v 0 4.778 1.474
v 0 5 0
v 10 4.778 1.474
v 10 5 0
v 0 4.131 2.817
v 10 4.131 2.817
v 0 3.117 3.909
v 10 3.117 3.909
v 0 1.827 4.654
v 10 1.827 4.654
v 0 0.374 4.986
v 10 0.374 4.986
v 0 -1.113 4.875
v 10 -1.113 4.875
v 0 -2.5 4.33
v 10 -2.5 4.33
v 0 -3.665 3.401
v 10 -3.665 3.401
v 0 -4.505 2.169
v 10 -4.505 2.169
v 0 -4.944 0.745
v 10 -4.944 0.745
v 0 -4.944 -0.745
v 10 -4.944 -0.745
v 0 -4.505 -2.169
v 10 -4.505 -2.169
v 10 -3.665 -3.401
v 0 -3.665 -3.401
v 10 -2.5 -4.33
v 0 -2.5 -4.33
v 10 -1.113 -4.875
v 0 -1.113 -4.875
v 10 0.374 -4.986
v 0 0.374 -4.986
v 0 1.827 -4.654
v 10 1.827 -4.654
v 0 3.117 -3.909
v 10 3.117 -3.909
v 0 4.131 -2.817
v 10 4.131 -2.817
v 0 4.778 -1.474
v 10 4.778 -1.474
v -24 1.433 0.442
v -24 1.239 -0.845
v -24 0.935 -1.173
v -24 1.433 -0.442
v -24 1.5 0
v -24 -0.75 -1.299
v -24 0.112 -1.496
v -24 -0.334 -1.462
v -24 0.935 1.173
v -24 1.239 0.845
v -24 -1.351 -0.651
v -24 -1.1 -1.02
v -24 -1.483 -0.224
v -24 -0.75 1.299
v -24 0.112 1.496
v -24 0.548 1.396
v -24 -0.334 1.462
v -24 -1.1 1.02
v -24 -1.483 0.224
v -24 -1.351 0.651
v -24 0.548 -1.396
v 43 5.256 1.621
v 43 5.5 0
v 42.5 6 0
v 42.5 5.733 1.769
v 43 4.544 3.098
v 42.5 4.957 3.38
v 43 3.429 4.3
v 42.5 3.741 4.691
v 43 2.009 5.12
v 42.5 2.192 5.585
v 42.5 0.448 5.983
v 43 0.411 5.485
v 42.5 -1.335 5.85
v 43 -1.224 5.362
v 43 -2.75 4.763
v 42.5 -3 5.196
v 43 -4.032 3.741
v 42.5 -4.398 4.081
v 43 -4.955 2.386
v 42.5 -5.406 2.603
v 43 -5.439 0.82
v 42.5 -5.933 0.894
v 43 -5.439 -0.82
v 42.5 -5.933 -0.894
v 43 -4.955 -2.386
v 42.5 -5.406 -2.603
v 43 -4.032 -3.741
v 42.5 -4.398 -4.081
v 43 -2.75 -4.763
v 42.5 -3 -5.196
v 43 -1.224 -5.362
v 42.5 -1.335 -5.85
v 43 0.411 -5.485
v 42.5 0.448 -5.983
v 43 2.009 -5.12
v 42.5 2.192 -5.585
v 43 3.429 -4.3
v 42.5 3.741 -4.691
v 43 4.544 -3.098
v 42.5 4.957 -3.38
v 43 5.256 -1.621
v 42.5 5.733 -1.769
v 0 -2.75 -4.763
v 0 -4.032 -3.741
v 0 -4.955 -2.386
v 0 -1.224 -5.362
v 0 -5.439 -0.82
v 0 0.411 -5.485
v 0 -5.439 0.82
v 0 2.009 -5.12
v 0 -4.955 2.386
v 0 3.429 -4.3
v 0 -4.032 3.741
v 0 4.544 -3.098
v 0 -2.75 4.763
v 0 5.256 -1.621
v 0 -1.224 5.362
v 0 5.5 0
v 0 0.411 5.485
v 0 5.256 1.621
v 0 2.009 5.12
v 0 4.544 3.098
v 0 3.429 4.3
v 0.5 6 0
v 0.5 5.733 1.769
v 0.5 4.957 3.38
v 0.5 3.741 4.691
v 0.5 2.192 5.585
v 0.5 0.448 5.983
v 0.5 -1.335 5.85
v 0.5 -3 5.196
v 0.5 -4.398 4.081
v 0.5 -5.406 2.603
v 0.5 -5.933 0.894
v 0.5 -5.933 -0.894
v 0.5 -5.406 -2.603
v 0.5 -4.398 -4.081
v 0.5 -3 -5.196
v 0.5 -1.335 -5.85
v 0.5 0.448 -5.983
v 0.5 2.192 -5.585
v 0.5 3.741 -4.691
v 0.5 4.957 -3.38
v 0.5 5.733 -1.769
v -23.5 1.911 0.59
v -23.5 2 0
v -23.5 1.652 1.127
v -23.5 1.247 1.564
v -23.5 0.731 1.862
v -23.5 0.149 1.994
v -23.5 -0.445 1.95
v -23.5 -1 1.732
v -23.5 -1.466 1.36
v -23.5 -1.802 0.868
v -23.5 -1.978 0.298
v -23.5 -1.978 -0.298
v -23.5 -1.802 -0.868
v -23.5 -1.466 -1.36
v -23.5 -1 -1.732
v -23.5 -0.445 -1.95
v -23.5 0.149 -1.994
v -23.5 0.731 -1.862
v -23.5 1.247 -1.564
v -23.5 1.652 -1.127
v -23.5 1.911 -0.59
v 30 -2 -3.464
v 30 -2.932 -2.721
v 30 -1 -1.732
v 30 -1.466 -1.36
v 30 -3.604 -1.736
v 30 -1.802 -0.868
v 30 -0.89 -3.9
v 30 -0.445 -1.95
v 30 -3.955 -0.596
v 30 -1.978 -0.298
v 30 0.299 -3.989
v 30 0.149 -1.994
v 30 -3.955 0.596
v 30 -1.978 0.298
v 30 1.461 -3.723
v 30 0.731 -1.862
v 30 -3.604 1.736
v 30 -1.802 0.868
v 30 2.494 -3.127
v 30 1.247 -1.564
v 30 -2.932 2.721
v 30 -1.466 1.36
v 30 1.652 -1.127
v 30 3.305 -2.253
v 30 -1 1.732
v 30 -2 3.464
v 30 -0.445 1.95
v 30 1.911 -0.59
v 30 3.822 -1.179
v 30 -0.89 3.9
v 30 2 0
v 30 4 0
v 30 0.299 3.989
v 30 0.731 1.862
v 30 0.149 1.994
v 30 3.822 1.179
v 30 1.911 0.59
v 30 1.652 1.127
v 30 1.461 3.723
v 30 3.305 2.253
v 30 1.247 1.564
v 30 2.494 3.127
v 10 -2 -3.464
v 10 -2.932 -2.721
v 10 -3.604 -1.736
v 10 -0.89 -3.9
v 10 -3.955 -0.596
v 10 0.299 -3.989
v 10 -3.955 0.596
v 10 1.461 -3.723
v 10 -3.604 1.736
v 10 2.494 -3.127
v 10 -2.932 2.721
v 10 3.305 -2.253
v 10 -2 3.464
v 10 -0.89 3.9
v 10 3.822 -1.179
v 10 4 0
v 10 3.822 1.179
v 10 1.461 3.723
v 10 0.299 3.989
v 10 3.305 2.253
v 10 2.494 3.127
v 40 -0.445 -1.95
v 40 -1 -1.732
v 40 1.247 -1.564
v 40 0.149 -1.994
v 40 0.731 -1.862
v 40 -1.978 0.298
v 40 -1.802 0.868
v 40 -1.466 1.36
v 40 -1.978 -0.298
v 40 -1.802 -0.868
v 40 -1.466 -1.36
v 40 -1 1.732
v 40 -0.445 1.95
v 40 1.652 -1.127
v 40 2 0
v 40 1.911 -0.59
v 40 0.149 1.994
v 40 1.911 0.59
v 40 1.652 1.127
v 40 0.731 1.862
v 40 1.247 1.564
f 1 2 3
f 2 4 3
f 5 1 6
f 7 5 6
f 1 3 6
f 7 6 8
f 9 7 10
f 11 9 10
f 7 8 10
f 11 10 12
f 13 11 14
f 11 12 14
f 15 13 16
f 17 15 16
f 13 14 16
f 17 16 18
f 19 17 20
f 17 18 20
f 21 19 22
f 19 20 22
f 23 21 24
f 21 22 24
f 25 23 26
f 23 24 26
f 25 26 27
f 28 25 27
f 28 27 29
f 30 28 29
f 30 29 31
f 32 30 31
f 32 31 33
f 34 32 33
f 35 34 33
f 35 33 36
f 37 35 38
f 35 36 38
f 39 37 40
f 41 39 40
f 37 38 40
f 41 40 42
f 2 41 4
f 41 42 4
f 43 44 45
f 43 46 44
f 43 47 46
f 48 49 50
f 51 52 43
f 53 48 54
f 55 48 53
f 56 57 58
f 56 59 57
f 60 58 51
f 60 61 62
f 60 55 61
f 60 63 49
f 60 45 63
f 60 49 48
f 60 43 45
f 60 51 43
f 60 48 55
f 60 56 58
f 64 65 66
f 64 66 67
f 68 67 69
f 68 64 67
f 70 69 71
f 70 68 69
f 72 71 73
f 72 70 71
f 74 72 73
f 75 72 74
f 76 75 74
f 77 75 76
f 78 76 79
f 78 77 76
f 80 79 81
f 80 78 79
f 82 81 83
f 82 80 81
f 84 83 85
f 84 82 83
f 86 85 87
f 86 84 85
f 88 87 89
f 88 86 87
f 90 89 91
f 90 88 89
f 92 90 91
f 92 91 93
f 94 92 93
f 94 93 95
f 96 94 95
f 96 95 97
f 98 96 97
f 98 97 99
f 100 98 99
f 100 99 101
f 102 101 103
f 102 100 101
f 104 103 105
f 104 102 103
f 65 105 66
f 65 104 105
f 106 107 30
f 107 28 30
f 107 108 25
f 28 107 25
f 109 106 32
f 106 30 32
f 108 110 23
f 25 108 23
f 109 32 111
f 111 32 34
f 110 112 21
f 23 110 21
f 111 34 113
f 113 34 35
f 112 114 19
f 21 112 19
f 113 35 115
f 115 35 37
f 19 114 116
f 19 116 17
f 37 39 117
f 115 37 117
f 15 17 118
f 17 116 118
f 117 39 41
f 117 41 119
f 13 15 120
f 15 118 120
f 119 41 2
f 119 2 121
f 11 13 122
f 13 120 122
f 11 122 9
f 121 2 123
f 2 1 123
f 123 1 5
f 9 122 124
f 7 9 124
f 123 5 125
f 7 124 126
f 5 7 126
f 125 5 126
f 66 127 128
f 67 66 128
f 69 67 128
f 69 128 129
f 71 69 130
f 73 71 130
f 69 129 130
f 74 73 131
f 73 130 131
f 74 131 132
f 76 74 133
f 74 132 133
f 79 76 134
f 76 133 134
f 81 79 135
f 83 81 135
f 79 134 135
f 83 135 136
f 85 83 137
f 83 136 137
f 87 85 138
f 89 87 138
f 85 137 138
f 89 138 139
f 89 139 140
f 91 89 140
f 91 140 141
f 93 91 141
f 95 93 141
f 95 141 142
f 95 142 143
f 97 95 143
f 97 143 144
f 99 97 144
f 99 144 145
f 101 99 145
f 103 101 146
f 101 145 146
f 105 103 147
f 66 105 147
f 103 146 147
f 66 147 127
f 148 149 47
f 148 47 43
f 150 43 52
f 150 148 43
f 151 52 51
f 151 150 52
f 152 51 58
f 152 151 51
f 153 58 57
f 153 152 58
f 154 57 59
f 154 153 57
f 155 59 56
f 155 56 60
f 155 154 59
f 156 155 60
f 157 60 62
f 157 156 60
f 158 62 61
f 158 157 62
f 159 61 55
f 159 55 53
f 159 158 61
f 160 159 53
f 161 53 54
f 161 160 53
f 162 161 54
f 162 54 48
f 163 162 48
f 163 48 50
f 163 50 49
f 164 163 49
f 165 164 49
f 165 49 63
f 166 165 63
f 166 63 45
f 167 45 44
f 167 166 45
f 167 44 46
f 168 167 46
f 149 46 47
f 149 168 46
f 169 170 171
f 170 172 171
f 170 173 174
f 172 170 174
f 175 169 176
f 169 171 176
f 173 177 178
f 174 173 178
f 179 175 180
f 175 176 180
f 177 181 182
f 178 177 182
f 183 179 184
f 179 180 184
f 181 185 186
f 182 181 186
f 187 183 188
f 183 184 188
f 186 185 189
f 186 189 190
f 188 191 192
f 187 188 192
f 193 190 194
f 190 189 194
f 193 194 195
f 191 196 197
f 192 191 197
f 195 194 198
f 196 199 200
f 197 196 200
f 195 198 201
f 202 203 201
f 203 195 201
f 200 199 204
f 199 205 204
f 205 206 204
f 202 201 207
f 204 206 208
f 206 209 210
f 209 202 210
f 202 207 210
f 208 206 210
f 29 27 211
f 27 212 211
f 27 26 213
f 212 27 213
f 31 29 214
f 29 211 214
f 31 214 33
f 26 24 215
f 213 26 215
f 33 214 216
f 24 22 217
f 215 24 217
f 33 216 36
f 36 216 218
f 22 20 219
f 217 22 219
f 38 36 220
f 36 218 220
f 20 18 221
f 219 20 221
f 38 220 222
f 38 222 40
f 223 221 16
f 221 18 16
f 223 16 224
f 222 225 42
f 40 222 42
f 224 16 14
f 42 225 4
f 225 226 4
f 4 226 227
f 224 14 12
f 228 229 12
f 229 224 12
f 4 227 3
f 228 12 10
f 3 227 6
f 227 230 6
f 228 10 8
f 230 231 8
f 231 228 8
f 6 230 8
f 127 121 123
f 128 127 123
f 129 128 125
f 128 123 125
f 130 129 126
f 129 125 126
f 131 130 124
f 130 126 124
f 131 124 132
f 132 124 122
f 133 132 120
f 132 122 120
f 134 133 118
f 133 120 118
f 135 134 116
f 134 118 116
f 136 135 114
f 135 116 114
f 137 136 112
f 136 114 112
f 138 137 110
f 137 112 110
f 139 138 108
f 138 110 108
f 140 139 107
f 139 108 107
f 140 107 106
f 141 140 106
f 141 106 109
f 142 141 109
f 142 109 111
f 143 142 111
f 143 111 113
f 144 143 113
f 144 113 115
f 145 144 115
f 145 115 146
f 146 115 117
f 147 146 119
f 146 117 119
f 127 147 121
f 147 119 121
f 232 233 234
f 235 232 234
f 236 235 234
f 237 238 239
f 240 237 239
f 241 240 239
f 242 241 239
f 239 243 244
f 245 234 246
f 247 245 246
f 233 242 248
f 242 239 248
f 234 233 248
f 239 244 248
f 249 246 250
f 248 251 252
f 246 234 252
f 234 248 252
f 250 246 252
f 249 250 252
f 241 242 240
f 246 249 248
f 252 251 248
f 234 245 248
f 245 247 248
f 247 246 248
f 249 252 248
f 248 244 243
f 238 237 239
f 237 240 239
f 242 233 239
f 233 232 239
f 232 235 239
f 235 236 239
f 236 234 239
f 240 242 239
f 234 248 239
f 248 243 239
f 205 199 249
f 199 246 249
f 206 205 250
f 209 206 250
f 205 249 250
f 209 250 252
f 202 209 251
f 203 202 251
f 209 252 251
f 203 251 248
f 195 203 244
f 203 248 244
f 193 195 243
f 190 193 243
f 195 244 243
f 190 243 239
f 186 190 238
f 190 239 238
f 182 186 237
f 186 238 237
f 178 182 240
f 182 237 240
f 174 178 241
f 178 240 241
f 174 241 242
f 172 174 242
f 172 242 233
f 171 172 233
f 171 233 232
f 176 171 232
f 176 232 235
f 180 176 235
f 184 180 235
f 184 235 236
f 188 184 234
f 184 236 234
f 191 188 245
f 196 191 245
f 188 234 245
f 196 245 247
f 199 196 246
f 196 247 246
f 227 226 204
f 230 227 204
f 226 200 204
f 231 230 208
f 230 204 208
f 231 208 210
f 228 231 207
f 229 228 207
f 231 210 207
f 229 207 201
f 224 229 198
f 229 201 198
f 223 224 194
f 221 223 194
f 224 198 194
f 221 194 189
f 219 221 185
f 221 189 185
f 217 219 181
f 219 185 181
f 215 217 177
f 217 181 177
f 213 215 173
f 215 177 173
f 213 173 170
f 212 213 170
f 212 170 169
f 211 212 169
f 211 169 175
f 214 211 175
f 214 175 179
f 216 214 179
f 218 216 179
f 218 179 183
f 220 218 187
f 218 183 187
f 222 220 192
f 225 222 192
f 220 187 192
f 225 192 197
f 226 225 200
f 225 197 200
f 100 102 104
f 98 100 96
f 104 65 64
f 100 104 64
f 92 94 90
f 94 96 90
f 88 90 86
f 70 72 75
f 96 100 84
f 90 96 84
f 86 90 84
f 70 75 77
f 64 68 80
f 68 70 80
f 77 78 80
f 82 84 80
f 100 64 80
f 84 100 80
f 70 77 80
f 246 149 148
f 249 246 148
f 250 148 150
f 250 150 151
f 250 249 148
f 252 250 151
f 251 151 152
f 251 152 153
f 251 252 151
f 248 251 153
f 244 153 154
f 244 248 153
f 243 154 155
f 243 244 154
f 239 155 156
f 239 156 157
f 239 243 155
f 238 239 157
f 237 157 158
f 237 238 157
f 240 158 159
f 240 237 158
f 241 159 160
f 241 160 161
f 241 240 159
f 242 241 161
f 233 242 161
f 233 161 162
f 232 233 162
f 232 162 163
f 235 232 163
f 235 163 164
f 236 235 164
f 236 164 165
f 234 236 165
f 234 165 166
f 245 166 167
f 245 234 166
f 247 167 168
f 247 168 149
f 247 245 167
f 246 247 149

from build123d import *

# Parameters (mm, degrees)
F2_SIZE = 0.5
F3_W    = 64
F3_H    = 2
F5_SIZE = 0.5


with BuildPart() as f1:
    # F0 (on Top) → F1 (revolve)
    with BuildSketch(Plane.XY):
        Polygon((43, 6), (0, 6), (0, 5), (10, 5), (10, 4), (30, 4), (30, 2), (40, 2), (40, 0), (43, 0), align=None)
    revolve(axis=Axis((29.847804, 0, 0), (1, 0, 0)))

    # F2
    f2_edges = [f1.edges().sort_by_distance(p)[0] for p in [
        (0, -6, 0),
        (43, -6, 0),
    ]]
    chamfer(f2_edges, length=F2_SIZE)


with BuildPart() as f4:
    # F3 (on Top) → F4 (revolve)
    with BuildSketch(Plane.XY):
        with Locations((8, 1)):
            Rectangle(F3_W, F3_H)
    revolve(axis=Axis((8, 0, 0), (1, 0, 0)))

    # F5
    f5_edges = [f4.edges().sort_by_distance(p)[0] for p in [
        (-24, -2, 0),
    ]]
    chamfer(f5_edges, length=F5_SIZE)


solid = Compound([f1.part, f4.part])
